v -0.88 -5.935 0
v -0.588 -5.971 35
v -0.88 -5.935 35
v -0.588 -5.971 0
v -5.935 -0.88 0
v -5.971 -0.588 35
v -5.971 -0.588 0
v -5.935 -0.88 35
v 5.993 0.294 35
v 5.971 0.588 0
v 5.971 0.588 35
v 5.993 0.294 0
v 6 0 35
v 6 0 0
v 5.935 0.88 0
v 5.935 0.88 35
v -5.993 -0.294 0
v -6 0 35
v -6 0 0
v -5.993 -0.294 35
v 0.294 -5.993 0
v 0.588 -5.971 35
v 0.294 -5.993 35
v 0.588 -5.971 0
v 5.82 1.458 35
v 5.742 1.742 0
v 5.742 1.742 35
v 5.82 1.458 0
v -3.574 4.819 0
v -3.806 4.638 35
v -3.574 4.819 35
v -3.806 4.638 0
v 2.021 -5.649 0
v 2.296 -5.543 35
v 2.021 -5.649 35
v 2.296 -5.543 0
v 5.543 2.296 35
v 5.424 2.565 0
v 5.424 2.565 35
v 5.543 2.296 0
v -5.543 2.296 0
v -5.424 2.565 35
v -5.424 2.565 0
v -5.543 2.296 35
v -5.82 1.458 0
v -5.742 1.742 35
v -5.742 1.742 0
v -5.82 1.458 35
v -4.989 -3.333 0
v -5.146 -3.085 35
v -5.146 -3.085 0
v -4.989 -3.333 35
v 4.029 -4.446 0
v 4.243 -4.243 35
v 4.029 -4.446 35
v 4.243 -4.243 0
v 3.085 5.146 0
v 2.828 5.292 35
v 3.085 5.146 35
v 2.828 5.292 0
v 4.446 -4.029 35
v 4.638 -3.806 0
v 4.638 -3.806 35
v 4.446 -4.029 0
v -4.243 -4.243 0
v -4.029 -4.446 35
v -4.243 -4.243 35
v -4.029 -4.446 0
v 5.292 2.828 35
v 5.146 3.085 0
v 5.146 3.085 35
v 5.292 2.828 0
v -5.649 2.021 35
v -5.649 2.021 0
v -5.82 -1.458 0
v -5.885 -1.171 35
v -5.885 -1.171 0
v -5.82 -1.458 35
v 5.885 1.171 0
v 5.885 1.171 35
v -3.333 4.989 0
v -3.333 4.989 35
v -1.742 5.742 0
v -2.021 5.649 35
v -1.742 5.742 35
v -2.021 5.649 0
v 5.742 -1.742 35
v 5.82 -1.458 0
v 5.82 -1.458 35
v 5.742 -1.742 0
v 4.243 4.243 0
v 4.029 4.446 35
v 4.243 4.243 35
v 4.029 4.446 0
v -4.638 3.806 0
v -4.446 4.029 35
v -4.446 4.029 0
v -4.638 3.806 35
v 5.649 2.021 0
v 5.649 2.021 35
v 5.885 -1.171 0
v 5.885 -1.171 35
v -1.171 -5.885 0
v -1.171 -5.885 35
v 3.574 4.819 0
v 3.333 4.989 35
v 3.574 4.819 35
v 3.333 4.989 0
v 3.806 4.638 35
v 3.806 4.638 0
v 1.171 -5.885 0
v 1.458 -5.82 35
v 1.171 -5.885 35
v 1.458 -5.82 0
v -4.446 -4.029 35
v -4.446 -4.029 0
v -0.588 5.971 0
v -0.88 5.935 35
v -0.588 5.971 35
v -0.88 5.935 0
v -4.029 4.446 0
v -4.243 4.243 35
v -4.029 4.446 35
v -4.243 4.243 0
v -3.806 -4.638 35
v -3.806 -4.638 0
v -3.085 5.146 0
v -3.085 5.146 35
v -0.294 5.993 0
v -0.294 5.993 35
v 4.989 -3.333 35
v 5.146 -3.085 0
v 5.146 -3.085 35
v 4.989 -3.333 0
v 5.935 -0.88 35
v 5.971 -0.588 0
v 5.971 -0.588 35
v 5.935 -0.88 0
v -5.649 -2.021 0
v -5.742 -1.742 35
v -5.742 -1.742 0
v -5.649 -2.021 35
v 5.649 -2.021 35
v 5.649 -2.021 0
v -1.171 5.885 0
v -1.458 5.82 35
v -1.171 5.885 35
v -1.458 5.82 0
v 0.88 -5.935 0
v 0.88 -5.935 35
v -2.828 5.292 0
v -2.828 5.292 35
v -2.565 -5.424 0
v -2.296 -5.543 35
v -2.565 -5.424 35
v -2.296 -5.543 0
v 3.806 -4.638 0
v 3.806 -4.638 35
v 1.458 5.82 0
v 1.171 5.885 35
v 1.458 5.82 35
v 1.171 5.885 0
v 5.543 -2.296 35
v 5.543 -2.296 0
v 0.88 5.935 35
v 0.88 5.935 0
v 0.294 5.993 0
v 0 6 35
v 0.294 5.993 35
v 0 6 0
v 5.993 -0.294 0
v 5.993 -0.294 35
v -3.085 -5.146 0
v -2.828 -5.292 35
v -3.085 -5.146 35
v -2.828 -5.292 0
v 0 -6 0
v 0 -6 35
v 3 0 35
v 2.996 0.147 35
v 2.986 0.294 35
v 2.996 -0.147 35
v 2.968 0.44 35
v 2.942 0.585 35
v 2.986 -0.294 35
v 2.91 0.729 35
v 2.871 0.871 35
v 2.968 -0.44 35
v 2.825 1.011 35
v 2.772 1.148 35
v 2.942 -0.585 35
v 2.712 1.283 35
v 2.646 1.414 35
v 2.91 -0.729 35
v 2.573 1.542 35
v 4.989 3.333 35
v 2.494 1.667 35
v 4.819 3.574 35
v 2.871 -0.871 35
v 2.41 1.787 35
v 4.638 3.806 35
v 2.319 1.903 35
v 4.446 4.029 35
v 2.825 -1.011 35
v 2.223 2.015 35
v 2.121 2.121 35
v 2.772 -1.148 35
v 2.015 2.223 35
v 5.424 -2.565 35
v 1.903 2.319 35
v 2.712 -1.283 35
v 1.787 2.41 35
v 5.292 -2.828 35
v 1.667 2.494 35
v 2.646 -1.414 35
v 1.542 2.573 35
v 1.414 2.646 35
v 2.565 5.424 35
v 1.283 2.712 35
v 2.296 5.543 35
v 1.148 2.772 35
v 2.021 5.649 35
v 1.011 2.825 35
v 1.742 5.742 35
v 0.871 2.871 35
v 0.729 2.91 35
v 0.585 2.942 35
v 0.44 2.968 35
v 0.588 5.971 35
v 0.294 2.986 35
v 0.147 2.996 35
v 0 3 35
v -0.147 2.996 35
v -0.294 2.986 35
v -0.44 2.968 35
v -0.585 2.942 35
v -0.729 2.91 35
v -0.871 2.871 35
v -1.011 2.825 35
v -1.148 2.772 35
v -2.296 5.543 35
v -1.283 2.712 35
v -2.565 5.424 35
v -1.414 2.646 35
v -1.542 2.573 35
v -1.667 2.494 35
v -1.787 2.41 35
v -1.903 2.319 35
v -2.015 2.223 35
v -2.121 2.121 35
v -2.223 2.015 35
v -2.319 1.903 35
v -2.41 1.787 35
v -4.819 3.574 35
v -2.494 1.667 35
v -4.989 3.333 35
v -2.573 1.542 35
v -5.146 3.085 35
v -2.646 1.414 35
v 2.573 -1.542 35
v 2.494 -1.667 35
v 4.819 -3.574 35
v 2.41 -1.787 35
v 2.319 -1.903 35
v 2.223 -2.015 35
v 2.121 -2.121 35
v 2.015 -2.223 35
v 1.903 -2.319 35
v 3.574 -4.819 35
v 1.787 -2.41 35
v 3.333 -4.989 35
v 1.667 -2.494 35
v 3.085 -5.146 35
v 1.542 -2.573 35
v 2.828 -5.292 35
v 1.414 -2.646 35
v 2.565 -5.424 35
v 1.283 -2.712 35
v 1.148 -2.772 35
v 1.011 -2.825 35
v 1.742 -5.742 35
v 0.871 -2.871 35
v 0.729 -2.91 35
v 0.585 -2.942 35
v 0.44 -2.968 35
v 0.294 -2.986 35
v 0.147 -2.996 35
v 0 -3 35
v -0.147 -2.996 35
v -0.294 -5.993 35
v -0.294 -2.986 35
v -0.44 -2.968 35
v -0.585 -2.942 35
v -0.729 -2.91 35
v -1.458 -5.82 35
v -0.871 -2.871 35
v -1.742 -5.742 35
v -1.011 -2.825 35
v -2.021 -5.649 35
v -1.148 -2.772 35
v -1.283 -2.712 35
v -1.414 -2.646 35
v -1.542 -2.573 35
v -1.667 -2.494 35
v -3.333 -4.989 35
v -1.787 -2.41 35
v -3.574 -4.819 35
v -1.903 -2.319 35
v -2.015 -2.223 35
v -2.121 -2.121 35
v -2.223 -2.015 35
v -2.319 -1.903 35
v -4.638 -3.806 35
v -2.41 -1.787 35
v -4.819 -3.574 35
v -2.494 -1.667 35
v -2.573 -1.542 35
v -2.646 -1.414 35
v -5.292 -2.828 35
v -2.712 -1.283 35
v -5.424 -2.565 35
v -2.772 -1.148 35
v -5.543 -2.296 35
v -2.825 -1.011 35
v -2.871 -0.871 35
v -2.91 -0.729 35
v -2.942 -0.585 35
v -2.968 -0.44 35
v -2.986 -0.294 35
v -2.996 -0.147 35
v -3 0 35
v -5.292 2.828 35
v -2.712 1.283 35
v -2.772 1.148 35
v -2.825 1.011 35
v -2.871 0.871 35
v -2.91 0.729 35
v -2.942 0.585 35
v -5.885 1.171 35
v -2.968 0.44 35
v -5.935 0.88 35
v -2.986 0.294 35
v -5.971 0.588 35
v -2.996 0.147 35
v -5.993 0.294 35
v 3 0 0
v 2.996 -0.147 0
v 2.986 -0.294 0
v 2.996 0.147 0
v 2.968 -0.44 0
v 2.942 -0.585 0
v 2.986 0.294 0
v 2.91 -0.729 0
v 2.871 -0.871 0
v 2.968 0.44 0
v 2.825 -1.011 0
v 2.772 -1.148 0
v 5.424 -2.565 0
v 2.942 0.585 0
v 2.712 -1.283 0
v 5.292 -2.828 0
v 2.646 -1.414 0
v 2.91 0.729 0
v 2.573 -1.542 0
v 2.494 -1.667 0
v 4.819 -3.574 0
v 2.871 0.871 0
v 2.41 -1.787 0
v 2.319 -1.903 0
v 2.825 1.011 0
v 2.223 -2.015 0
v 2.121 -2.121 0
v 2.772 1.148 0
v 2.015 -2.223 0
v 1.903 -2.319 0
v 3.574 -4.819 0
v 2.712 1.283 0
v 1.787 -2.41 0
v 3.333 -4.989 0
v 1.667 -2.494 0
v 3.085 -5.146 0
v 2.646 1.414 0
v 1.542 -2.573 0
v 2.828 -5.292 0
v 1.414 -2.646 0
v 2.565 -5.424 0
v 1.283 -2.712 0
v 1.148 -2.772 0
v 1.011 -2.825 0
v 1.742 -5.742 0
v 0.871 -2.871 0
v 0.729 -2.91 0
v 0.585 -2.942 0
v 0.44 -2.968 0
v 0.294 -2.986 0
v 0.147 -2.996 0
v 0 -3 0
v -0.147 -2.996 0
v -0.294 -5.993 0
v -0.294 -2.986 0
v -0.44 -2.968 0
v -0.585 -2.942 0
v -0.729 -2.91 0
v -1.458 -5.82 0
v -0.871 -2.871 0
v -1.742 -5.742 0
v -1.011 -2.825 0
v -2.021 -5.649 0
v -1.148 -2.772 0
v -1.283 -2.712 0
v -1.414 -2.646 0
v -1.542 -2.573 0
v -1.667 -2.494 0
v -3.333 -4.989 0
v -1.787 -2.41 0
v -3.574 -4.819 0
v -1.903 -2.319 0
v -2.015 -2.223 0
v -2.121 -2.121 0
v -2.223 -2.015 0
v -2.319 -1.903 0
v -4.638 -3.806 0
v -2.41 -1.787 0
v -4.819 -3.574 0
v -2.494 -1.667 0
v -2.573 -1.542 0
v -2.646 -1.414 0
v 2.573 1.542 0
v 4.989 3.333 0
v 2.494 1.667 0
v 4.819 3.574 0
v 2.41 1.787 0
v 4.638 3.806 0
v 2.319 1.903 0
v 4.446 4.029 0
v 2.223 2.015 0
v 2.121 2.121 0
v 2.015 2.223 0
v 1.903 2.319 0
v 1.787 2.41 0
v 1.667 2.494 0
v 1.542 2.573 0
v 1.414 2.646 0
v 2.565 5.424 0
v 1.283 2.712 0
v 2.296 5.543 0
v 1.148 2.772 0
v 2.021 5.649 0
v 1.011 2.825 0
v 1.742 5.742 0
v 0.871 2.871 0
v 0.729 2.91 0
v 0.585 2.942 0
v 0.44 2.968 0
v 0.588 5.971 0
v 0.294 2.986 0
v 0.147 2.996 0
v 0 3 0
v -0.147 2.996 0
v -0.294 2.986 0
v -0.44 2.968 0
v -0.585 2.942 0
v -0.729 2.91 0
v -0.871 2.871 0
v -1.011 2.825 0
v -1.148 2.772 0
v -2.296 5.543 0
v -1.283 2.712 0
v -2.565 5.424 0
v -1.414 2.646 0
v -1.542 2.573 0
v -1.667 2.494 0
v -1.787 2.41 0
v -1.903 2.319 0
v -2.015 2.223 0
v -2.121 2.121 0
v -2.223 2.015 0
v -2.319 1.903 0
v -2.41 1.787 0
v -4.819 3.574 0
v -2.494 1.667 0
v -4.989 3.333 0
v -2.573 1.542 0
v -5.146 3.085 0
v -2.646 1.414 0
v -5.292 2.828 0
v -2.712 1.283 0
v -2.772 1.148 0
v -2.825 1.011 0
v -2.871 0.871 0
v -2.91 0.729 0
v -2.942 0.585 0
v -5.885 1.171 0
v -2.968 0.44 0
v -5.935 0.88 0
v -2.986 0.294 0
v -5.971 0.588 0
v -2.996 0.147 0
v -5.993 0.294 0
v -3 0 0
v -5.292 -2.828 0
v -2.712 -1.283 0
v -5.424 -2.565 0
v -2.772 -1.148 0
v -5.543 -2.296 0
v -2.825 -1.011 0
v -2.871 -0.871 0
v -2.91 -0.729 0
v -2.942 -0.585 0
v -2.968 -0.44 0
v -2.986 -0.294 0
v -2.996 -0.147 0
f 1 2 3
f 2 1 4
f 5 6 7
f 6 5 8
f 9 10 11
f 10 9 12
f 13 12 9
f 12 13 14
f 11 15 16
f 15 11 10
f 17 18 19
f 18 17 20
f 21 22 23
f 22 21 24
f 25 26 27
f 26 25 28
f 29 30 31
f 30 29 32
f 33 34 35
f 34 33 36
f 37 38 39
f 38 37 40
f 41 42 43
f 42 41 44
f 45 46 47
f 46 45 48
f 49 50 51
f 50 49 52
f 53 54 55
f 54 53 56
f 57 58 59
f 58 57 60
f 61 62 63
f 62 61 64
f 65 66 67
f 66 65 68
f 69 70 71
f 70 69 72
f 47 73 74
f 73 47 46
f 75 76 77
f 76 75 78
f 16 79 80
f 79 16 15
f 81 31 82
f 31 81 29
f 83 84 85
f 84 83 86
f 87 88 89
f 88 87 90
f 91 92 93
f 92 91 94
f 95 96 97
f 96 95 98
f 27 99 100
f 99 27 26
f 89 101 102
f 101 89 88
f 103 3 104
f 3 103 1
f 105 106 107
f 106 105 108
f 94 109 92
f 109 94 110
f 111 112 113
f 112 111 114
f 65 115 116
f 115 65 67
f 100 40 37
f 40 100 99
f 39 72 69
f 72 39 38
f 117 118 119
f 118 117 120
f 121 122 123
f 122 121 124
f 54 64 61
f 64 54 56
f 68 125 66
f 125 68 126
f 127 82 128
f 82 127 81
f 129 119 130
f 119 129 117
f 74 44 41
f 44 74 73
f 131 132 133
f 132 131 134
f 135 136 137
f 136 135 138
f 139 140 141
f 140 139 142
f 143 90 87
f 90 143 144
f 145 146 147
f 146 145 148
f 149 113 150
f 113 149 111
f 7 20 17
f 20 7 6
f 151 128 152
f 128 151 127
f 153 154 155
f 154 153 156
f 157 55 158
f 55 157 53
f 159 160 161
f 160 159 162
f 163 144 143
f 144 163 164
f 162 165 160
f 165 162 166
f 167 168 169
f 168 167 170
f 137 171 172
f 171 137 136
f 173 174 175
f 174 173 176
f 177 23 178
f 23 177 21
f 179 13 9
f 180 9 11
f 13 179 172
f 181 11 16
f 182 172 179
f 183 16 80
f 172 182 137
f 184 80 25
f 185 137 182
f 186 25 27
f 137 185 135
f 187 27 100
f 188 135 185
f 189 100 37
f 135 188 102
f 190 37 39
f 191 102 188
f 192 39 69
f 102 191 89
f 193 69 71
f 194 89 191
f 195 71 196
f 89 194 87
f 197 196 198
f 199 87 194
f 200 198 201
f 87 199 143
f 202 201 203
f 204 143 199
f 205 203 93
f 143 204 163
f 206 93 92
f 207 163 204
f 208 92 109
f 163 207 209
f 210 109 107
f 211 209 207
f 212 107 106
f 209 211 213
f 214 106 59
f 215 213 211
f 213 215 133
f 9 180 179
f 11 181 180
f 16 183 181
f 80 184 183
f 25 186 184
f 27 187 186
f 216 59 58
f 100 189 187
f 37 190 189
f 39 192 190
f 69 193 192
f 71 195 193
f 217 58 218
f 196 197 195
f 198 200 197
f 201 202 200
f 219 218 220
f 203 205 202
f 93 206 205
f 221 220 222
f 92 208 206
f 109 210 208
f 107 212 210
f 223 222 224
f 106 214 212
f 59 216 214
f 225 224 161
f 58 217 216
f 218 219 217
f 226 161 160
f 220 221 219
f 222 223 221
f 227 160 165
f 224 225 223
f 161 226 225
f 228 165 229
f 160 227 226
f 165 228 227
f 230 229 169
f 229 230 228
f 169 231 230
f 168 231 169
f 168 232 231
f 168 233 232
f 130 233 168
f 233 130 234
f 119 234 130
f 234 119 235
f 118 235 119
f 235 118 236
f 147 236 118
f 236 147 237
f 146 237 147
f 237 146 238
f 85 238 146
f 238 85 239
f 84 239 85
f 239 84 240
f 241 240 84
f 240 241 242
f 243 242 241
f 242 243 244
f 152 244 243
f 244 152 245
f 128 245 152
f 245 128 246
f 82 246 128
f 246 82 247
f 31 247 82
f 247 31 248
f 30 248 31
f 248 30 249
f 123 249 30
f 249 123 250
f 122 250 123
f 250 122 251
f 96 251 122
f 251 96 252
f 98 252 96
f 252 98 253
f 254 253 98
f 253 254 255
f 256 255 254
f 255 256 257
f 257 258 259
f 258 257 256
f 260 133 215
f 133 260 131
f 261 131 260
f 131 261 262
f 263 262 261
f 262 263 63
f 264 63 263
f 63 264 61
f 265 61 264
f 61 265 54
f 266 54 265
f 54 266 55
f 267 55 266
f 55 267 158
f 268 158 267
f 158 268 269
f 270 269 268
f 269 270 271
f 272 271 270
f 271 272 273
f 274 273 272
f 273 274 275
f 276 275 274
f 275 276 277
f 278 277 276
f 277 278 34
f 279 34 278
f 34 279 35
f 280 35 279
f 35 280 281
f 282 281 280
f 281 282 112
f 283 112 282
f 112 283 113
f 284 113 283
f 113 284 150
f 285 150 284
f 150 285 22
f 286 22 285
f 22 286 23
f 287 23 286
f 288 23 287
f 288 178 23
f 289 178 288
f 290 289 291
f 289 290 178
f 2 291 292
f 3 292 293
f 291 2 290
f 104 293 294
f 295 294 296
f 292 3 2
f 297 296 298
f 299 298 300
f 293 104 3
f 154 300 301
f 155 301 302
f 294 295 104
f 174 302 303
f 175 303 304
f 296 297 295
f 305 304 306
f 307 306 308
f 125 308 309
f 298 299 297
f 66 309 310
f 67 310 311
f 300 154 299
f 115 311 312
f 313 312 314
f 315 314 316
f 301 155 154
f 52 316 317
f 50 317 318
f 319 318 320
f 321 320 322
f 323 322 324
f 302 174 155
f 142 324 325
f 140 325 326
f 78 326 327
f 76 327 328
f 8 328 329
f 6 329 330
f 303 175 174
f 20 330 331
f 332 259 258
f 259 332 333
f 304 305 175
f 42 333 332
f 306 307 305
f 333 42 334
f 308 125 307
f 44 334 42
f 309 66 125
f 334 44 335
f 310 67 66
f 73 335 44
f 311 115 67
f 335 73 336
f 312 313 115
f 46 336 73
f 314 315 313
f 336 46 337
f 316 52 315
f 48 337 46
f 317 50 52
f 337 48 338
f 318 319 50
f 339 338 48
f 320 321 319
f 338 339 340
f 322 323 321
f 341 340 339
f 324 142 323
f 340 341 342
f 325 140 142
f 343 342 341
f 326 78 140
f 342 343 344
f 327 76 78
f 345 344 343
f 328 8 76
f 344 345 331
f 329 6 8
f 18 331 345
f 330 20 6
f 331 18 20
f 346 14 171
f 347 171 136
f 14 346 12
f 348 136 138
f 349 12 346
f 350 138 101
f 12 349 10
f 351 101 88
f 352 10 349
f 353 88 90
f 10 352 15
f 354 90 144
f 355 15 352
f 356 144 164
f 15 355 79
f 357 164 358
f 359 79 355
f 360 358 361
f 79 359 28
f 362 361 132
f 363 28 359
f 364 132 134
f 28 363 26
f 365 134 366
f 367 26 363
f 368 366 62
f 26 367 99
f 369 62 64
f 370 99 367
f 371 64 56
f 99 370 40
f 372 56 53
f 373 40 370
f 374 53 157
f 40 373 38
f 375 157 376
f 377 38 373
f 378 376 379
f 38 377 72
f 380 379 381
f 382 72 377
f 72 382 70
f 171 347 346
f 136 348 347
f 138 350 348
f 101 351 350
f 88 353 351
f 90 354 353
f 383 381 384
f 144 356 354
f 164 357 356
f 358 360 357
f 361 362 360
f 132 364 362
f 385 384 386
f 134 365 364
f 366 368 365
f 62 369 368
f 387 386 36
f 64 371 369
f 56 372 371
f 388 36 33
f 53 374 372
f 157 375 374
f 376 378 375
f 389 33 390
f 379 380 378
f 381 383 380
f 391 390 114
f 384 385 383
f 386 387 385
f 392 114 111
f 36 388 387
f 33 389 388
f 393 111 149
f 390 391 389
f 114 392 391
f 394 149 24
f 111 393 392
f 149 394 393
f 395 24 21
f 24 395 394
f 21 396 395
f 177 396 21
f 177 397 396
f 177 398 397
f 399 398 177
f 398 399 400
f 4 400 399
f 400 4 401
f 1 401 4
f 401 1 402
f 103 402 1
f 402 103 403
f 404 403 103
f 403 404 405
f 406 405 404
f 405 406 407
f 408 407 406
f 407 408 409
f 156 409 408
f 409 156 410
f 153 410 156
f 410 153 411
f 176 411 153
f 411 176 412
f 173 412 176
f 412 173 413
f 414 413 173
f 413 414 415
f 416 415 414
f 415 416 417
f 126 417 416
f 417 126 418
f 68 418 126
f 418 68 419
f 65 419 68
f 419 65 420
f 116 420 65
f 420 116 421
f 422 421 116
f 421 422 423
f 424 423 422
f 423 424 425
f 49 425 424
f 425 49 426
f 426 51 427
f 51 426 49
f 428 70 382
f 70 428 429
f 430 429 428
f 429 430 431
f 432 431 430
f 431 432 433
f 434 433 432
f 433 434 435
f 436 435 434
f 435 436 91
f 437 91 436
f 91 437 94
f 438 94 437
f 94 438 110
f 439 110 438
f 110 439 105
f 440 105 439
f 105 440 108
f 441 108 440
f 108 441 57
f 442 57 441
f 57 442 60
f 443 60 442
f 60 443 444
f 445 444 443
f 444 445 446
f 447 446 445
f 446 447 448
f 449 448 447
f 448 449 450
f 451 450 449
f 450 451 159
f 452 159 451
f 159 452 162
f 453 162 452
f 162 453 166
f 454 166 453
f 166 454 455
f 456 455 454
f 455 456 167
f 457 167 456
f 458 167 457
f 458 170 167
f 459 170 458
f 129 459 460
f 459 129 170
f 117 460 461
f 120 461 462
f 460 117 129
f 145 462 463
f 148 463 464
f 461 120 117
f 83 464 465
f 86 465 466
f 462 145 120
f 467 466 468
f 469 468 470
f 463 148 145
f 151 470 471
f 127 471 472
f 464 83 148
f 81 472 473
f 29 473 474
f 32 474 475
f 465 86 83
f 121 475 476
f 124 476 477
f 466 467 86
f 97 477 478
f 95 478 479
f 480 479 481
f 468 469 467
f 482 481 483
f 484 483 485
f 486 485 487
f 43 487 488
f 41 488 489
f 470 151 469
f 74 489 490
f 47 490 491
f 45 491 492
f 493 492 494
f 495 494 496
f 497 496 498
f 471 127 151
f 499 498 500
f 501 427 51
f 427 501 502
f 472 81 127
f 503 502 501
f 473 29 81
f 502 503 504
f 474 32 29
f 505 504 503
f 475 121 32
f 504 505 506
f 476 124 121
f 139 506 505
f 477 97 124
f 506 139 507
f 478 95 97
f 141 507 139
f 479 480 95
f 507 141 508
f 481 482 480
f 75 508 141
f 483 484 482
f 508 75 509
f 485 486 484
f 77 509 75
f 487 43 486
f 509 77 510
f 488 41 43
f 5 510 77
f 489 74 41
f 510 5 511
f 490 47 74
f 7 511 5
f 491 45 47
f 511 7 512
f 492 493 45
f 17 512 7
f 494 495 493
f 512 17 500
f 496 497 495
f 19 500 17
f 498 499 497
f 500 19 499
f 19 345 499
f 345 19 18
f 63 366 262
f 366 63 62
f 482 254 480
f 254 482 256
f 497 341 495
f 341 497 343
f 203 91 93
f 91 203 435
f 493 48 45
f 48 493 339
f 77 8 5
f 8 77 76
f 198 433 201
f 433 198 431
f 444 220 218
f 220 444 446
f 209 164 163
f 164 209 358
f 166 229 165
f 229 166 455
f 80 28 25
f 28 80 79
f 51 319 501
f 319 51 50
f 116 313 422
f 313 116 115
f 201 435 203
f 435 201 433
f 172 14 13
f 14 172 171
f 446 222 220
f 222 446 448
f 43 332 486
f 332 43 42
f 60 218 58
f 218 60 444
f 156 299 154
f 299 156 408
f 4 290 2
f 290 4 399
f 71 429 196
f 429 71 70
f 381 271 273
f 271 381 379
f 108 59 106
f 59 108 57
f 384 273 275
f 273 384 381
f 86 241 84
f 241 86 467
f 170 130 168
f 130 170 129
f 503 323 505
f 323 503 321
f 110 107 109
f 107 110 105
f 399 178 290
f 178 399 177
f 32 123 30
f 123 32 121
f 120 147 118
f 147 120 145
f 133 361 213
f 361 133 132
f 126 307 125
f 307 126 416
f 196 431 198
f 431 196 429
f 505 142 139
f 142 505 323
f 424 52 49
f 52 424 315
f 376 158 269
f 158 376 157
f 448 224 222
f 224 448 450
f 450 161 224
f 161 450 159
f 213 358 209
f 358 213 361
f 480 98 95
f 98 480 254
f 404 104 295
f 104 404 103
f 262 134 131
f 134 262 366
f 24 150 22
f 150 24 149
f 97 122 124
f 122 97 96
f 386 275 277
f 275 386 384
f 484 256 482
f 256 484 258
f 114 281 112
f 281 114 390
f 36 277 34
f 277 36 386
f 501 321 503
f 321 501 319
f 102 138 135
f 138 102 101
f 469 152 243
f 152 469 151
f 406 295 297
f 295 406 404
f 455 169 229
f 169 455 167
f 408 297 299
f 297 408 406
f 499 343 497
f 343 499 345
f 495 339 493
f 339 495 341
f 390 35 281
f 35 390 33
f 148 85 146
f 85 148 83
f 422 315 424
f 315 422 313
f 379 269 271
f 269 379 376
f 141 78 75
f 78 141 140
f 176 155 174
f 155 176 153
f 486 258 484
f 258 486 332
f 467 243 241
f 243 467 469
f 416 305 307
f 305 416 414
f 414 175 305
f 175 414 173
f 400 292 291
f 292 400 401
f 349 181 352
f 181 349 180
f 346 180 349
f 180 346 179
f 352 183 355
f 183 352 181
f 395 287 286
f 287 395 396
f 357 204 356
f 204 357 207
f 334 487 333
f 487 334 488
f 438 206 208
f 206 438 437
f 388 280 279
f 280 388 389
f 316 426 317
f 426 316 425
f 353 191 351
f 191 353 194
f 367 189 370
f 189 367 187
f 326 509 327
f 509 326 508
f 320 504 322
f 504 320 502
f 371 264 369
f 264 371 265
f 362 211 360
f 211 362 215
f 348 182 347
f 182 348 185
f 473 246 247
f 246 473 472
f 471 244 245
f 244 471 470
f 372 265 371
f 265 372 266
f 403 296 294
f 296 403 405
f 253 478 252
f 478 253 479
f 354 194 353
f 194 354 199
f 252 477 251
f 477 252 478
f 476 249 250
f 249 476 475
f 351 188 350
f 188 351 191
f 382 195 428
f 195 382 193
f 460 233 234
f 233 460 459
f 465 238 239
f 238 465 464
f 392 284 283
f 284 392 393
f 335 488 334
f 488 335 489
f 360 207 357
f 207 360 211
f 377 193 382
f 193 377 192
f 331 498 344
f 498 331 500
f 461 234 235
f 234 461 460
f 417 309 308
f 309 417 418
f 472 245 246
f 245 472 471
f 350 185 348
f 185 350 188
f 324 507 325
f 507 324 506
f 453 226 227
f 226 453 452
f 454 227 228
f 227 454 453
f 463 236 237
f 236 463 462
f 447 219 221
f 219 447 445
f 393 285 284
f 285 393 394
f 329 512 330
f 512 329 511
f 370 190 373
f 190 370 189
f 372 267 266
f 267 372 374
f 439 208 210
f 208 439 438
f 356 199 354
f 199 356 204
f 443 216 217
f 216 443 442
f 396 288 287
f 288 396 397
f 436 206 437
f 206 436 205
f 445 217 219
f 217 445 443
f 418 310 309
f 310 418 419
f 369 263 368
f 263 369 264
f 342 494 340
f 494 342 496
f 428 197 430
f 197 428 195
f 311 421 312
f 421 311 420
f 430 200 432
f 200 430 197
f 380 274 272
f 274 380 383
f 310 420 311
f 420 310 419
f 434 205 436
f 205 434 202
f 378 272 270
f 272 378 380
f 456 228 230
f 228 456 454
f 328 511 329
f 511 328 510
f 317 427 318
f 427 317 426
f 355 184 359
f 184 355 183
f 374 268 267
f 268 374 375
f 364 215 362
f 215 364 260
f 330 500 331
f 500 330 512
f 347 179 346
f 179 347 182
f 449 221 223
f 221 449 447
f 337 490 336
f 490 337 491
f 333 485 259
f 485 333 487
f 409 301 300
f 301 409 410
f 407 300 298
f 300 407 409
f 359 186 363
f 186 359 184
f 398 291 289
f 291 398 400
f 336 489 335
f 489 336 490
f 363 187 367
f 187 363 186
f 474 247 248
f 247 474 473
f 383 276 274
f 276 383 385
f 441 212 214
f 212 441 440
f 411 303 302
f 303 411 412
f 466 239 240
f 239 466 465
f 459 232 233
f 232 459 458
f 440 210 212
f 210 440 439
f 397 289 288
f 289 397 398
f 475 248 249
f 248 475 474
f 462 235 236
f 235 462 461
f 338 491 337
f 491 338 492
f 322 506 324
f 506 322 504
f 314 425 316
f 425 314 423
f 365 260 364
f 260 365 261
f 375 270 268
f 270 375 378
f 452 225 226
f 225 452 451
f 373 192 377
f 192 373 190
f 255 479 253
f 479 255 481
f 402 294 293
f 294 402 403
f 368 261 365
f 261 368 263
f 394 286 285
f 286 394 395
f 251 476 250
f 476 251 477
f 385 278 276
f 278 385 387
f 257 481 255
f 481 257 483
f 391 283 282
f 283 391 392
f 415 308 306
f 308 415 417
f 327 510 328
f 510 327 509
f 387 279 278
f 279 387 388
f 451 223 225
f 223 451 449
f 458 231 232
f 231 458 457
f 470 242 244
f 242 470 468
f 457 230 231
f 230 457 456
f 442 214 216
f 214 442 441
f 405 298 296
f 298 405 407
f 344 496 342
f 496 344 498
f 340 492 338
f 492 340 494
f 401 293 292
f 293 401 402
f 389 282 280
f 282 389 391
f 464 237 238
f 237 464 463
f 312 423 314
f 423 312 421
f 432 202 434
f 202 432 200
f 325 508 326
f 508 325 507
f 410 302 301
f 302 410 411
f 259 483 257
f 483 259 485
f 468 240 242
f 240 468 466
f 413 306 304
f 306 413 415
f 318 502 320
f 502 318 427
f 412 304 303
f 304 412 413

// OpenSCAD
$fn = 128;

bore_d = 6.0;
od_d   = 12.0;
len    = 35.0;

difference() {
  cylinder(d = od_d, h = len, center = false);
  translate([0,0,-0.1])
    cylinder(d = bore_d, h = len + 0.2, center = false);
}
